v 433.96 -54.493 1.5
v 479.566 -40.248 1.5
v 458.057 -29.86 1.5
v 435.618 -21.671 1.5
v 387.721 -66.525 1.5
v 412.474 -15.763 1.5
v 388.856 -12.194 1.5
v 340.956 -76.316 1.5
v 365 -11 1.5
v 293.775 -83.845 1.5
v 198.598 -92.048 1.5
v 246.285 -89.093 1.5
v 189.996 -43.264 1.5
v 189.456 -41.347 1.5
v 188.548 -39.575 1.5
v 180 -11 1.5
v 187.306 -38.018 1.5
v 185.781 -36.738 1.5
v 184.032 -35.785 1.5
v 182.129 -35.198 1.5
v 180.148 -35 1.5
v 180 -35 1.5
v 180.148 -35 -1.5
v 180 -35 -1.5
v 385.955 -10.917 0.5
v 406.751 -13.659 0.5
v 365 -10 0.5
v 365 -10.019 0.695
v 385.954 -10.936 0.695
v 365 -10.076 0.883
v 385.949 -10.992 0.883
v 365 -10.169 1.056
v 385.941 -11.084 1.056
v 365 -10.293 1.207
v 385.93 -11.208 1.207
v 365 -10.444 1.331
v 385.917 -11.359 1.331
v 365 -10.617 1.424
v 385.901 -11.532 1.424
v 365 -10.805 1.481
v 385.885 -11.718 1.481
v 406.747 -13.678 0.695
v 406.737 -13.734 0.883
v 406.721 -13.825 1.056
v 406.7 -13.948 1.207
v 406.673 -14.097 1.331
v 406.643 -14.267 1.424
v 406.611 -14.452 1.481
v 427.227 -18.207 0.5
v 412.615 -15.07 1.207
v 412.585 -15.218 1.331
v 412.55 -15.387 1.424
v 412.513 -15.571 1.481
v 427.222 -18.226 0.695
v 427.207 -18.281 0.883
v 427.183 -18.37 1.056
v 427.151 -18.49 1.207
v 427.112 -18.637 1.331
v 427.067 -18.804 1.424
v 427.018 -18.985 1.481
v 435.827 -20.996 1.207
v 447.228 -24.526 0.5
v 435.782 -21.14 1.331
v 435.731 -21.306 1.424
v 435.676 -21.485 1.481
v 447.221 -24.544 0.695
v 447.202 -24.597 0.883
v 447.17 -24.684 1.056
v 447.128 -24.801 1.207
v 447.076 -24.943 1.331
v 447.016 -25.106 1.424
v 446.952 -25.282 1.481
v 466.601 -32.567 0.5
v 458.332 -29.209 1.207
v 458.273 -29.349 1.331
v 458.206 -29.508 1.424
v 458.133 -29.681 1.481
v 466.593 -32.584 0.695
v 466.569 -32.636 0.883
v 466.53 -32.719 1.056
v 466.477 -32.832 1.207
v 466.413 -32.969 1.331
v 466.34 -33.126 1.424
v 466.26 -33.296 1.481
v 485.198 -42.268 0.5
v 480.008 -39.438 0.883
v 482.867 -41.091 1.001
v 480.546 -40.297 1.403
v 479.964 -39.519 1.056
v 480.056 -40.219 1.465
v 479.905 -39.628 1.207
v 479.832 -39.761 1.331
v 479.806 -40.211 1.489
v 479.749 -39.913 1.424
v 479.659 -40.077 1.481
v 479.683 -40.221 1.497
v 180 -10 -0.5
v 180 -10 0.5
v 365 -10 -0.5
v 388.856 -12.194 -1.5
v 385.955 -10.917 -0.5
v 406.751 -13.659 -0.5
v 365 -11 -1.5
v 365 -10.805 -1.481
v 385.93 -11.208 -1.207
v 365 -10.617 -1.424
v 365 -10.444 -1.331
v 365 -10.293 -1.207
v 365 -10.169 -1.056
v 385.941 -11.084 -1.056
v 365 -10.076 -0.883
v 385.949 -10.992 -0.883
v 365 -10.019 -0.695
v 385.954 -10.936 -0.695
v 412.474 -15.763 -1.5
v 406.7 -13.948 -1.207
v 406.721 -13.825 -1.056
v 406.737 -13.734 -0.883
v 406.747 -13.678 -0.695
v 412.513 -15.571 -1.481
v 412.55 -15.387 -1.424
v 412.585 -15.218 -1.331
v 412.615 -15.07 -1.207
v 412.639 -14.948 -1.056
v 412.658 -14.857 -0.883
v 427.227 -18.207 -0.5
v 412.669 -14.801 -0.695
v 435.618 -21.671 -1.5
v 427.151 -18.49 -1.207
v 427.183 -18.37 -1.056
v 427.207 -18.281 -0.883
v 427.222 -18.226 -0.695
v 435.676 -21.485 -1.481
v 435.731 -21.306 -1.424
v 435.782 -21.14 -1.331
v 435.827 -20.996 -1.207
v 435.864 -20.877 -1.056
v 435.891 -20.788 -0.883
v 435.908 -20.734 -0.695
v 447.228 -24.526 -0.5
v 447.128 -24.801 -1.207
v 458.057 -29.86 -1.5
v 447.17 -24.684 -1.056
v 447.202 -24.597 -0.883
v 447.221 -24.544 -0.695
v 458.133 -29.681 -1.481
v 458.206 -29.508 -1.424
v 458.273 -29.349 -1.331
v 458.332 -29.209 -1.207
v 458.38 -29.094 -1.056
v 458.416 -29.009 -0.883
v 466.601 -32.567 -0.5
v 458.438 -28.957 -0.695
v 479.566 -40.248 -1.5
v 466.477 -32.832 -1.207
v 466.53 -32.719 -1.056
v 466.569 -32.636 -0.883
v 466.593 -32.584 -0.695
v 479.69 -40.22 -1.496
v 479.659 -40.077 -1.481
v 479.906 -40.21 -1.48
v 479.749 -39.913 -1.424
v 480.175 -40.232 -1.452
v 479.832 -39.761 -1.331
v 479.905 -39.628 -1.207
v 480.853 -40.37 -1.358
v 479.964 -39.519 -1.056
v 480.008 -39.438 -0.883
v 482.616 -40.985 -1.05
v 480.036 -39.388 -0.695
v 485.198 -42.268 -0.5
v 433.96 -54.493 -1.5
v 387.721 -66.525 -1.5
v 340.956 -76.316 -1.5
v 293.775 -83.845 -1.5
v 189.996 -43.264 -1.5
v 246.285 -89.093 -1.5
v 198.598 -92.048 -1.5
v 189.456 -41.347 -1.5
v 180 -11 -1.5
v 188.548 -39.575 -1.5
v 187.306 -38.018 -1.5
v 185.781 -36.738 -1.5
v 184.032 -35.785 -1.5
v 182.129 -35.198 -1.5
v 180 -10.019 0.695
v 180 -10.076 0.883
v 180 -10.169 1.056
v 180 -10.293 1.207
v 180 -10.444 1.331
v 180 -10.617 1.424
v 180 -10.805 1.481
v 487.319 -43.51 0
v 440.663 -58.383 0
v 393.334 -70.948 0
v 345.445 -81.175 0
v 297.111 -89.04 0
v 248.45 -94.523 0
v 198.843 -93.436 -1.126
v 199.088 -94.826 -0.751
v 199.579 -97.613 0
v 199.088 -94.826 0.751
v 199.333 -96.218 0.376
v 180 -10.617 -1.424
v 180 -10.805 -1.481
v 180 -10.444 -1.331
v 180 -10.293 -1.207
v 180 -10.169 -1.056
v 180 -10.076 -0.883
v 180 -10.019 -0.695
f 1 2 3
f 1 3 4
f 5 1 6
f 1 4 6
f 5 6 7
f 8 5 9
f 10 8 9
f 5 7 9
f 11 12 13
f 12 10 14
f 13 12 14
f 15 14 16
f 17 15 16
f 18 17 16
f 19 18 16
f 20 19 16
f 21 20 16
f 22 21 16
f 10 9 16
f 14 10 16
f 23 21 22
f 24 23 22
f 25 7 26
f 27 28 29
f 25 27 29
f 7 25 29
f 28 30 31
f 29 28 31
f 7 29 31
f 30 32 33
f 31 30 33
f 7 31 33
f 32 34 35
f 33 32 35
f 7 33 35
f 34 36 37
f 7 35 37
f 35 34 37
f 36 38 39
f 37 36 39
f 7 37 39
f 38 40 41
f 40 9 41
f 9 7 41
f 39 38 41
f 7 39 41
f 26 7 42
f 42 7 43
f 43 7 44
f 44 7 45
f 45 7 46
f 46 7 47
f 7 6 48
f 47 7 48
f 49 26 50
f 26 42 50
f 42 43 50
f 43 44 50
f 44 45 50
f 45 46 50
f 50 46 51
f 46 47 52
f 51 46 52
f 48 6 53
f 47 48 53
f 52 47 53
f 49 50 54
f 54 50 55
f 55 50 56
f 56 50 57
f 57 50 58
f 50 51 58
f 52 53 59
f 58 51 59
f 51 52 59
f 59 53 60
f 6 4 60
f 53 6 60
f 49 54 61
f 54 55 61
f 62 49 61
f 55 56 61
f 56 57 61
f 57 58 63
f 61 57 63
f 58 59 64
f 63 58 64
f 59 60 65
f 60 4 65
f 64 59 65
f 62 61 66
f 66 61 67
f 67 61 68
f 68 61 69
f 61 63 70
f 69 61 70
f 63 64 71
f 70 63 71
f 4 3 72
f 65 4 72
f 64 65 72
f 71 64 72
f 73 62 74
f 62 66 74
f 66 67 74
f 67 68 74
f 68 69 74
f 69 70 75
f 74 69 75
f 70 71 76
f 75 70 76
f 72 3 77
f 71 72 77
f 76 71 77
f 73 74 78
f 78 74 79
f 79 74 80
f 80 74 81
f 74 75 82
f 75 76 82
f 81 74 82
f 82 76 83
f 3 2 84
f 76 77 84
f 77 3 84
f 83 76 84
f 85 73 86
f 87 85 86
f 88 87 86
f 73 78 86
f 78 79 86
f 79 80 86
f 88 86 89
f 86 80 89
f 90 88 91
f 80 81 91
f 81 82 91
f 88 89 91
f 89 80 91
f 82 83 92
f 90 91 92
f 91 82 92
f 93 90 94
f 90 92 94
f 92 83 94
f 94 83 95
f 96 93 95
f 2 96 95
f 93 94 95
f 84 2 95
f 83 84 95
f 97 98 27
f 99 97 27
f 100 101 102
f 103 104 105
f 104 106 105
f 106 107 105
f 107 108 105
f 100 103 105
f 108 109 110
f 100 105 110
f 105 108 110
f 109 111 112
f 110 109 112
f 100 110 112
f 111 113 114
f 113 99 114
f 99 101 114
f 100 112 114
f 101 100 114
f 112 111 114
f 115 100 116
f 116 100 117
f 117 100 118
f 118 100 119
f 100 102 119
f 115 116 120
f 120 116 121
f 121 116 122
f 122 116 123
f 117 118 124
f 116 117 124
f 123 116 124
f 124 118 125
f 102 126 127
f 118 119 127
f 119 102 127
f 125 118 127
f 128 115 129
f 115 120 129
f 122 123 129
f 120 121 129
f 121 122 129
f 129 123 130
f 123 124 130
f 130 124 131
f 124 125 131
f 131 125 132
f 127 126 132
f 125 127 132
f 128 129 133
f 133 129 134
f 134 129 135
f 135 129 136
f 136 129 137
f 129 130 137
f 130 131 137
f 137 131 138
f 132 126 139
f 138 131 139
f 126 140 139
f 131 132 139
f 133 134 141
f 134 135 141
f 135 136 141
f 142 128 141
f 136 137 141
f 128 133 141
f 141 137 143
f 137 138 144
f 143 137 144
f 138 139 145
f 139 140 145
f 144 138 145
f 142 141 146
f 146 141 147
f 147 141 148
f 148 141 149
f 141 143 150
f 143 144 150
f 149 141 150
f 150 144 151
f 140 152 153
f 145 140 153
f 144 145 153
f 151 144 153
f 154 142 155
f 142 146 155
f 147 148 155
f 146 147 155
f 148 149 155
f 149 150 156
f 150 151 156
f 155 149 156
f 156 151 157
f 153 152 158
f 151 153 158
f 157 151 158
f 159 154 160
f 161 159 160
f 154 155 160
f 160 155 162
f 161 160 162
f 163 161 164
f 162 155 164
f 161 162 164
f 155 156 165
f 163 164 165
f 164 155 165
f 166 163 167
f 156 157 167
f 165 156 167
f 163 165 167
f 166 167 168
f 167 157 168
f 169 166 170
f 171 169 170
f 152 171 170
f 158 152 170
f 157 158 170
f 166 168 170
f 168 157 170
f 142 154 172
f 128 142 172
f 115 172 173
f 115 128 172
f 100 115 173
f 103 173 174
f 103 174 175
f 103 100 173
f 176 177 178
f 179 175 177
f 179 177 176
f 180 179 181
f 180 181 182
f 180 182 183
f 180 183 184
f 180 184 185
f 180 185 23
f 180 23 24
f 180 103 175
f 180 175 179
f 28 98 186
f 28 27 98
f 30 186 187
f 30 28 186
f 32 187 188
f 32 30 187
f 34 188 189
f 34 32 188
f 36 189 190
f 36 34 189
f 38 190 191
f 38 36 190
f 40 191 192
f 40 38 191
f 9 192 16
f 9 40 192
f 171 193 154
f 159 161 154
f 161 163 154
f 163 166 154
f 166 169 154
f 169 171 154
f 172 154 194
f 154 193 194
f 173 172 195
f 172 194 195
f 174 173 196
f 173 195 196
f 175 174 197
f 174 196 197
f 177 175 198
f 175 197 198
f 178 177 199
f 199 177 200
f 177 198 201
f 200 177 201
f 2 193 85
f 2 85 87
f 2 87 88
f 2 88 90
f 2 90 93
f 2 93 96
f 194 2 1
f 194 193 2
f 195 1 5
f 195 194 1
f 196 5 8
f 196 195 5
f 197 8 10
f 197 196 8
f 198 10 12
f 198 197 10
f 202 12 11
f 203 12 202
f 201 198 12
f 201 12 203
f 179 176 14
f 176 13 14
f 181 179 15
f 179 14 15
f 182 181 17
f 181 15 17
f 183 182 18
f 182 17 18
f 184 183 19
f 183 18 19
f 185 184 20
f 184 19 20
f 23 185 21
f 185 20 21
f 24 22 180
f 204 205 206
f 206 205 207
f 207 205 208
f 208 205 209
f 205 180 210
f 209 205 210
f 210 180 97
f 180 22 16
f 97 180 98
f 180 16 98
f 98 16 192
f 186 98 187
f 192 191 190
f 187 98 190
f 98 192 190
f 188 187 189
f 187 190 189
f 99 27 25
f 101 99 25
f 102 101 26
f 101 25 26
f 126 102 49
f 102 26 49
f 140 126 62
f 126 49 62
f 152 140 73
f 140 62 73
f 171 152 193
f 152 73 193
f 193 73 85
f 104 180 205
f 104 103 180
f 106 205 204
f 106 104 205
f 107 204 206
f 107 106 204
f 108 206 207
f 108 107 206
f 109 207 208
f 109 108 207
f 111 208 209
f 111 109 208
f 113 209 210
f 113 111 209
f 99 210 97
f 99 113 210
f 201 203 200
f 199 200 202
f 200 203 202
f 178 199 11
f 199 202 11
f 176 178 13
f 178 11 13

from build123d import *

# Parameters (mm, degrees)
BOSS_EXTRUDE1_DEPTH = 1.5
CHAMFER1_SIZE       = 8
CHAMFER1_SIZE_2     = 2.143593539
FILLET1_R           = 1


with BuildPart() as part:
    # Sketch1 → Boss-Extrude1 (new, symmetric)
    with BuildSketch(Plane.XY):
        with BuildLine():
            Line((180, -10), (365, -10))
            ThreePointArc((365, -10), (429.92024724, -18.947275501), (490, -45.121987515))
            ThreePointArc((490, -45.121987515), (347.035778042, -83.318956837), (200, -100))
            Line((200, -100), (189.995827472, -43.263518223))
            ThreePointArc((189.995827472, -43.263518223), (186.575626039, -37.339555569), (180.147749942, -35))
            Line((180.147749942, -35), (180, -35))
            Line((180, -35), (180, -10))
        make_face()
    extrude(amount=BOSS_EXTRUDE1_DEPTH, both=True)

    # Chamfer1
    # the kernel refuses this chamfer: 8, 2.143593539 mm, written as the material it takes off along each edge
    with BuildSketch(Plane(origin=(161.101103388, 899.243151511, -1.5), x_dir=(0.3484448247934172, -0.9373292932980836, 0), z_dir=(0.9373292932980836, 0.3484448247934172, 0))) as chamfer1_piece_1:
        Polygon((1000 - CHAMFER1_SIZE, 0), (1000, -CHAMFER1_SIZE_2), (1000, 0), align=None)
    revolve(axis=Axis((161.101103388, 899.243151511, -1.5), (0, 0, -1)), revolution_arc=19.353184564, mode=Mode.SUBTRACT)
    with BuildSketch(Plane(origin=(161.101103388, 899.243151511, 1.5), x_dir=(0.3484448247934172, -0.9373292932980836, 0), z_dir=(0.9373292932980836, 0.3484448247934172, 0))) as chamfer1_piece_2:
        Polygon((1000 - CHAMFER1_SIZE, 0), (1000, CHAMFER1_SIZE_2), (1000, 0), align=None)
    revolve(axis=Axis((161.101103388, 899.243151511, 1.5), (0, 0, -1)), revolution_arc=19.353184564, mode=Mode.SUBTRACT)

    # Fillet1
    fillet1_edges = [part.edges().sort_by_distance(p)[0] for p in [
        (424.811924688, -17.572519557, -1.5),
        (424.811924688, -17.572519557, 1.5),
        (272.5, -10, -1.5),
        (272.5, -10, 1.5),
    ]]
    fillet(fillet1_edges, radius=FILLET1_R)


solid = part.part
